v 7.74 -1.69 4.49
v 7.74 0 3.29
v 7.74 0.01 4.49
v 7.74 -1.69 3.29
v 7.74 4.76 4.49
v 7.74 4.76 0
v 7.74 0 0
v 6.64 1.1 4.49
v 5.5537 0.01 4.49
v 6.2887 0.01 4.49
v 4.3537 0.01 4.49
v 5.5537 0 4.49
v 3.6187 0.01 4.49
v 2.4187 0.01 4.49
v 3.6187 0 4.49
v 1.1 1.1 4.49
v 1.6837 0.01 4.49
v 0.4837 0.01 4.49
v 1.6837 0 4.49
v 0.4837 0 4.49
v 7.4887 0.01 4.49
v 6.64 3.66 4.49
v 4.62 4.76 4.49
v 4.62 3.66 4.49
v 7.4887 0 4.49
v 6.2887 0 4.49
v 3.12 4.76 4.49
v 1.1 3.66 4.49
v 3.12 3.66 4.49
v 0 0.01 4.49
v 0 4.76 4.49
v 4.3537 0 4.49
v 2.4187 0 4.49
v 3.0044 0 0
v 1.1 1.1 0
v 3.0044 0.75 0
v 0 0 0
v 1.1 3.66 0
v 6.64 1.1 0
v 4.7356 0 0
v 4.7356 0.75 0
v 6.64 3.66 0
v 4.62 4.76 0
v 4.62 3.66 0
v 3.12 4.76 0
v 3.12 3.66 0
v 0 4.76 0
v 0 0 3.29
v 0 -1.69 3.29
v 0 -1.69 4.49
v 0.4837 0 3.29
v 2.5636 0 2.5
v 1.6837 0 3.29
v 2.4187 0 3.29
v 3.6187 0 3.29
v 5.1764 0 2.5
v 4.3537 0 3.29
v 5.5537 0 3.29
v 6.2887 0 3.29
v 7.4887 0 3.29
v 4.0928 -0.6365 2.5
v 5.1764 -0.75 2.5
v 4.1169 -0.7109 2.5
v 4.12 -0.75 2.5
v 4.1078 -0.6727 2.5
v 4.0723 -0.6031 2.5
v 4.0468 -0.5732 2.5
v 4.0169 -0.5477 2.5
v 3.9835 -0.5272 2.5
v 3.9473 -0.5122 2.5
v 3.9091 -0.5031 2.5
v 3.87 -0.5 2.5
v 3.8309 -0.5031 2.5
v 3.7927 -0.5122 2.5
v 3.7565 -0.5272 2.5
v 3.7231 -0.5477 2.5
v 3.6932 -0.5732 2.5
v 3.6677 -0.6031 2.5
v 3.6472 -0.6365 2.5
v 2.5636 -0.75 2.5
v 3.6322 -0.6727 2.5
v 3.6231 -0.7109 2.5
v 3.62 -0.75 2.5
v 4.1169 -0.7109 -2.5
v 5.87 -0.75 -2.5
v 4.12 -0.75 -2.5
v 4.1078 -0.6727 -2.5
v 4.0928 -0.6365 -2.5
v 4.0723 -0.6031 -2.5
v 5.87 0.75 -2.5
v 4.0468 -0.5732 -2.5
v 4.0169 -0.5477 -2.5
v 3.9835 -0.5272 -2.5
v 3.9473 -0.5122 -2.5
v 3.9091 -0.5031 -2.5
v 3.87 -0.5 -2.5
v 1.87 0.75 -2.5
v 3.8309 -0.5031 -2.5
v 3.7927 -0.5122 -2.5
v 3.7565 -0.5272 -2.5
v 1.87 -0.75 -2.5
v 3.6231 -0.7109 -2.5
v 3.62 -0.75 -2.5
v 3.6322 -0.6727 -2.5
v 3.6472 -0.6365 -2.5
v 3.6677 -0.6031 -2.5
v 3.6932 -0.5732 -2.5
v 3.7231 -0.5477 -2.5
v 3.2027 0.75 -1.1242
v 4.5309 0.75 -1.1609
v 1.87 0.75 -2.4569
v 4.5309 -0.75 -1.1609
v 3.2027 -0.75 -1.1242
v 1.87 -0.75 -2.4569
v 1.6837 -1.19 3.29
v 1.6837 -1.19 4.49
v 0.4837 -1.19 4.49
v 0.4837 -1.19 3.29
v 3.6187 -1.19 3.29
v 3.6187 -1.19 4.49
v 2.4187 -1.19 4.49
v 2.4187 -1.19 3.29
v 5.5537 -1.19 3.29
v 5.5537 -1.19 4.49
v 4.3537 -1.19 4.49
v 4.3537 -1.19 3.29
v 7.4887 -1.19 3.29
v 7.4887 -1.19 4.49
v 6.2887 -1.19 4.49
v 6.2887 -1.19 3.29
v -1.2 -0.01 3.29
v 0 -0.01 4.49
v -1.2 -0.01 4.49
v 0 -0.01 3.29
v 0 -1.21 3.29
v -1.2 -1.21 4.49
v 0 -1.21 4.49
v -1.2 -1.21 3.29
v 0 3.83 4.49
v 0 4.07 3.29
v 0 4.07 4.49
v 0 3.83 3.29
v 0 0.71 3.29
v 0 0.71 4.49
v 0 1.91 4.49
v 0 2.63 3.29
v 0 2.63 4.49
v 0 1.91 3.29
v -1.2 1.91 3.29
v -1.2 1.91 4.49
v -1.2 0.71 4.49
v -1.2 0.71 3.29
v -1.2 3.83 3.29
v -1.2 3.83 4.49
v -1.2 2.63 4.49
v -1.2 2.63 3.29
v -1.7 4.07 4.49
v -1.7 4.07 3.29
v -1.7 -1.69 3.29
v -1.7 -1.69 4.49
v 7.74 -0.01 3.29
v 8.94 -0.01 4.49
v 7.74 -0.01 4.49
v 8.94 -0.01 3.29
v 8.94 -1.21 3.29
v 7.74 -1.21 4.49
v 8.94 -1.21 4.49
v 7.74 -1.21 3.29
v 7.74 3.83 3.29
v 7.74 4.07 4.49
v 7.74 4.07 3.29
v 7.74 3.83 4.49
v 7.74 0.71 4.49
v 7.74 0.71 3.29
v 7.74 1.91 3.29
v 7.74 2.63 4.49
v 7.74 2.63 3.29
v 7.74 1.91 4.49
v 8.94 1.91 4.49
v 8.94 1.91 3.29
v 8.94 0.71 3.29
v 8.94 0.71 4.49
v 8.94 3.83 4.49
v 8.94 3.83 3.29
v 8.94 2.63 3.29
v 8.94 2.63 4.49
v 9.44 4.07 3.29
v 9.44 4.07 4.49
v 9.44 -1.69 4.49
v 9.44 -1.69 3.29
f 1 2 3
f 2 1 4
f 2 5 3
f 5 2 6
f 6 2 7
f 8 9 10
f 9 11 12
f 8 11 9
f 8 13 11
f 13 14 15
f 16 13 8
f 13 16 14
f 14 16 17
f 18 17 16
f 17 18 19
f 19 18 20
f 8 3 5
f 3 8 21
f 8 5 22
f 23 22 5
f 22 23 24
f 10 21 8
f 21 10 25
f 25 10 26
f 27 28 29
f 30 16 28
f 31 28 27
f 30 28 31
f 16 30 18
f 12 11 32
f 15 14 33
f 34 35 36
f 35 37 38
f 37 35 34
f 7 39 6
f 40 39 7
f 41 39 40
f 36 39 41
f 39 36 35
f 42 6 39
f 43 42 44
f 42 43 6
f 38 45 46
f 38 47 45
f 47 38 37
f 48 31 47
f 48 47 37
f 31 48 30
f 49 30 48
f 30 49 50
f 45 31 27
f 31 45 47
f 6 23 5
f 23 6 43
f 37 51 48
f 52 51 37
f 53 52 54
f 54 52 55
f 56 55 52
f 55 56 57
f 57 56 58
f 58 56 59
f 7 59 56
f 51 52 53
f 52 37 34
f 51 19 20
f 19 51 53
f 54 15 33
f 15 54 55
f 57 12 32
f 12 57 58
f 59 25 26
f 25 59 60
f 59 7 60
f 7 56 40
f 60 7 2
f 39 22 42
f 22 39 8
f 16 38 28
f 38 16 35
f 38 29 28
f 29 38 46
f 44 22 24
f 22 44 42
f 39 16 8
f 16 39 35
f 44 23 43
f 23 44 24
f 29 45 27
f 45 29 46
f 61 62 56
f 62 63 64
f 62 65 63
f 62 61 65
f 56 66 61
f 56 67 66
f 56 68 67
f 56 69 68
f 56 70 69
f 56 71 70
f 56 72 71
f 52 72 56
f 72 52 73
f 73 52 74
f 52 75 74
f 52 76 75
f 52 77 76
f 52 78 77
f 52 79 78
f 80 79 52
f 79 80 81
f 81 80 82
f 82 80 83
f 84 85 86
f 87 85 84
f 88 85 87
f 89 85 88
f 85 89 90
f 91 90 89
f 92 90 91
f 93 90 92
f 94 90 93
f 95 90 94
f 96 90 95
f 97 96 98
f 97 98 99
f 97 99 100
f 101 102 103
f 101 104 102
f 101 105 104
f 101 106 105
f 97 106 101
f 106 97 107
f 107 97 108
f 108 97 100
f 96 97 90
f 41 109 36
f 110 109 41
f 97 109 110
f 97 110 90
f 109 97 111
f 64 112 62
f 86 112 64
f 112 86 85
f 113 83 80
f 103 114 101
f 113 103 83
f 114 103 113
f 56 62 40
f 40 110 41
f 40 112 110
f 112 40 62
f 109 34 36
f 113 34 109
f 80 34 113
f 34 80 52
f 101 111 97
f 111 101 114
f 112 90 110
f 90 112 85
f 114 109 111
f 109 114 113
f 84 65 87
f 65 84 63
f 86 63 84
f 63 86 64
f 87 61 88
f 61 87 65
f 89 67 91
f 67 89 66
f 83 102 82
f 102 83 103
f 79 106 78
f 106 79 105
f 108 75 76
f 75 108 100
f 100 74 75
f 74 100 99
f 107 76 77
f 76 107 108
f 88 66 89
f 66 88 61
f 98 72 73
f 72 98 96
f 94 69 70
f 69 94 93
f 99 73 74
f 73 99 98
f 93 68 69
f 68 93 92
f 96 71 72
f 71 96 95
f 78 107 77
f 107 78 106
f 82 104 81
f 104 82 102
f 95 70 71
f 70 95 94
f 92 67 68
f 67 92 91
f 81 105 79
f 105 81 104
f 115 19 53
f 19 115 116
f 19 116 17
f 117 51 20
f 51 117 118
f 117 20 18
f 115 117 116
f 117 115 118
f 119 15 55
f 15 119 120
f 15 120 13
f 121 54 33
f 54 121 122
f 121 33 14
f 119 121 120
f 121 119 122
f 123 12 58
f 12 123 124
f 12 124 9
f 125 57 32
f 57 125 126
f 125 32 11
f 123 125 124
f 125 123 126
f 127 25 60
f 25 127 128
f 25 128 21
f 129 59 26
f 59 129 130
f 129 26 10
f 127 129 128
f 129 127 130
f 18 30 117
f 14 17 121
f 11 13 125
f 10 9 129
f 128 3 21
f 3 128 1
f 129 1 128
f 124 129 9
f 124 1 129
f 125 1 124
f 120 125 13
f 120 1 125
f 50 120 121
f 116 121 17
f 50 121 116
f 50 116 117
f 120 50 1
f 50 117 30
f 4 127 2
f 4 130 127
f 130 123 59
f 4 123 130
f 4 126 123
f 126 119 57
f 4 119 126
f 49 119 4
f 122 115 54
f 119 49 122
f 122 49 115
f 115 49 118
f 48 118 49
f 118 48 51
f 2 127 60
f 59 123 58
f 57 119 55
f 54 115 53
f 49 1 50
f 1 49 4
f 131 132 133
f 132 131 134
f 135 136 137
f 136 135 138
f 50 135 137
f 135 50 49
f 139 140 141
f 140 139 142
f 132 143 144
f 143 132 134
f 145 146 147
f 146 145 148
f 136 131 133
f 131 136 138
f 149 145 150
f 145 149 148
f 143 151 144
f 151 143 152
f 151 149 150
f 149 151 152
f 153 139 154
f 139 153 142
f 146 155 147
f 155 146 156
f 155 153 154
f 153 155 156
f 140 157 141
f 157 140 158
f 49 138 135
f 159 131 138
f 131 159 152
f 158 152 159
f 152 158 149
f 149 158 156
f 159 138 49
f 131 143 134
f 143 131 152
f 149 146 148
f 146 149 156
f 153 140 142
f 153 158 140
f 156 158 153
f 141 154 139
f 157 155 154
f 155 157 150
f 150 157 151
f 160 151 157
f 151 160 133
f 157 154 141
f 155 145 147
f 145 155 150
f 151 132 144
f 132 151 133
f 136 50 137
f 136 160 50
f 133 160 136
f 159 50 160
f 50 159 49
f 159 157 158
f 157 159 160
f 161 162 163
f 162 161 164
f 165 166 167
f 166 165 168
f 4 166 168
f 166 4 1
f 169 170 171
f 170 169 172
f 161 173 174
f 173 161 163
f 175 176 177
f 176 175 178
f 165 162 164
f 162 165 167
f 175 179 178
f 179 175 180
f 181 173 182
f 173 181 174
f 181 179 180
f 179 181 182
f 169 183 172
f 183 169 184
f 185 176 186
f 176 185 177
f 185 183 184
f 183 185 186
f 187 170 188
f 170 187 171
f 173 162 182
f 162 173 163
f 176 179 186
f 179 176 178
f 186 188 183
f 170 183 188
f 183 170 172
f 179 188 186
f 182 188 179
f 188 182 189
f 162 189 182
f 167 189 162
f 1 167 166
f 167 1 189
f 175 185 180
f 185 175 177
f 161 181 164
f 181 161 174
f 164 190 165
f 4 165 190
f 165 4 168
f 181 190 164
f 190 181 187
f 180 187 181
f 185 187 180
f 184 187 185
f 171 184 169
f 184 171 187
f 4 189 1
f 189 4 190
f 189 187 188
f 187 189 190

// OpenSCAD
// Created  by Kyler Brown, 2015

// units: mm
// connector: omnetics A8366-001   NPD-14-WD-18.0-GS

// *** makerbot replicator 2 specs ***
/*
Print Technology
Fused Deposition Modeling

Layer Resolution
100 microns [0.0039 in]

Positioning Precision
XY: 11 microns [0.0004 in]
Z: 2.5 microns [0.0001 in]

Filament Diameter
1.75 mm [0.069 in]

Nozzle Diameter
0.4 mm [0.015 in] 
*/



delta = 0.01; // prevent zero length walls.

connector_x = 5.54;
connector_z = 4.49;
connector_y = 2.56;
connector_wall_dia = 1.1;
connector_cut_x = 1.5;

block_x = 4;
block_y = 1.5;
block_z = 5;

cut_angle  = 10;
guide_diameter = .5;

module connector_holder (){
  difference(){
    cube([connector_x + 2*connector_wall_dia,
	  connector_y + 2*connector_wall_dia,
	  connector_z,
	  ]);
    translate([connector_wall_dia, connector_wall_dia, -delta]){
      cube([connector_x, connector_y, connector_z+2*delta]);
    }
    //strain relief cut
    translate([connector_wall_dia + connector_x /2 - connector_cut_x/2,
	        connector_wall_dia + connector_y -delta, -delta]){
      cube([connector_cut_x, 2*connector_wall_dia + 2*delta + connector_y, connector_z+2*delta]);
    }
  }
}



module block(){
  difference(){
    cube([block_x, block_y, block_z]);
    translate([6,0,3]){
      rotate([0,cut_angle,0]){
	cube([6,15,10], center=true);
      }
    }
    translate([-2,0,3]){
      rotate([0,-cut_angle,0]){
	cube([6,15,10], center=true);
      }
    }
  }
}

leg_length = block_x;
leg_dia = 1.5;
module block_with_legs(){
  union(){
    block();
    translate([0,0,0]){
      difference(){
	cube([leg_length, leg_dia, leg_dia]);
	translate([5.0, -delta,-1]){
	  rotate([0,-45,0]){
	    cube([leg_length, leg_dia+2*delta, 10]);
	  }
	}
	translate([-6.7, -delta,-1]){
	  rotate([0,45,0]){
	    cube([leg_length, leg_dia+2*delta, 10]);
	  }
	}
      }
    }
  }

}

module guide_cut(){
  union(){
    rotate([0,0,0]){
      cylinder(h=block_z+2*delta, r=guide_diameter/2, center=false, $fn=40);

      translate([-guide_diameter/2,-block_z, 0]){
	cube([guide_diameter, block_z, block_z+delta], center=false);
      }
    }
  }
}

module block_with_guide(){
  difference(){
    block_with_legs();
    translate([block_x/2, 0, -delta]){
      guide_cut();
    }

  }

}

// guides for wires

contact_h = 1.2;
contact_dia = 1.2; //connector wire diameter with insulation = 0.4mm
contact_wall_depth = 1.7;
module contact_guide(n0, length){
  // a securing feature to connect electrodes to connector channels
  contact_spacing = (length+2*connector_wall_dia) / (n0);
  difference(){
    cube([contact_spacing*(n0), contact_wall_depth, contact_h]);
    for (i = [1:n0]){
      translate([contact_spacing/4+contact_spacing*(i-1), contact_wall_depth-contact_dia, -delta])
	cube([contact_dia, contact_dia, contact_h+2*delta]);//*10+3*delta);
    }
  }
}

module all_contact_guides(){
  foo = (connector_x+2*connector_wall_dia)/4/4;
  translate([0, -contact_wall_depth+delta, connector_z-contact_h]){
    contact_guide(4, connector_x);
  }
  
  translate([-1*contact_wall_depth, -contact_wall_depth+delta, connector_z]){
    rotate([180,0,90]){
      contact_guide(3, connector_y+1);
    }
  }
  translate([connector_x+2*connector_wall_dia+contact_wall_depth,
	     -contact_wall_depth+delta, connector_z-contact_h]){
    rotate([0,0,90]){
      contact_guide(3, connector_y+1);
    }
  }
}

//connector_holder();

module full_array(){
  union(){
    connector_holder();
    translate([(connector_wall_dia + connector_x/2 - block_x/2),
	       -block_y/2,
	       -block_z/2]){
      block_with_guide();
    }
  }
}

union(){
  full_array();
  all_contact_guides();
}
